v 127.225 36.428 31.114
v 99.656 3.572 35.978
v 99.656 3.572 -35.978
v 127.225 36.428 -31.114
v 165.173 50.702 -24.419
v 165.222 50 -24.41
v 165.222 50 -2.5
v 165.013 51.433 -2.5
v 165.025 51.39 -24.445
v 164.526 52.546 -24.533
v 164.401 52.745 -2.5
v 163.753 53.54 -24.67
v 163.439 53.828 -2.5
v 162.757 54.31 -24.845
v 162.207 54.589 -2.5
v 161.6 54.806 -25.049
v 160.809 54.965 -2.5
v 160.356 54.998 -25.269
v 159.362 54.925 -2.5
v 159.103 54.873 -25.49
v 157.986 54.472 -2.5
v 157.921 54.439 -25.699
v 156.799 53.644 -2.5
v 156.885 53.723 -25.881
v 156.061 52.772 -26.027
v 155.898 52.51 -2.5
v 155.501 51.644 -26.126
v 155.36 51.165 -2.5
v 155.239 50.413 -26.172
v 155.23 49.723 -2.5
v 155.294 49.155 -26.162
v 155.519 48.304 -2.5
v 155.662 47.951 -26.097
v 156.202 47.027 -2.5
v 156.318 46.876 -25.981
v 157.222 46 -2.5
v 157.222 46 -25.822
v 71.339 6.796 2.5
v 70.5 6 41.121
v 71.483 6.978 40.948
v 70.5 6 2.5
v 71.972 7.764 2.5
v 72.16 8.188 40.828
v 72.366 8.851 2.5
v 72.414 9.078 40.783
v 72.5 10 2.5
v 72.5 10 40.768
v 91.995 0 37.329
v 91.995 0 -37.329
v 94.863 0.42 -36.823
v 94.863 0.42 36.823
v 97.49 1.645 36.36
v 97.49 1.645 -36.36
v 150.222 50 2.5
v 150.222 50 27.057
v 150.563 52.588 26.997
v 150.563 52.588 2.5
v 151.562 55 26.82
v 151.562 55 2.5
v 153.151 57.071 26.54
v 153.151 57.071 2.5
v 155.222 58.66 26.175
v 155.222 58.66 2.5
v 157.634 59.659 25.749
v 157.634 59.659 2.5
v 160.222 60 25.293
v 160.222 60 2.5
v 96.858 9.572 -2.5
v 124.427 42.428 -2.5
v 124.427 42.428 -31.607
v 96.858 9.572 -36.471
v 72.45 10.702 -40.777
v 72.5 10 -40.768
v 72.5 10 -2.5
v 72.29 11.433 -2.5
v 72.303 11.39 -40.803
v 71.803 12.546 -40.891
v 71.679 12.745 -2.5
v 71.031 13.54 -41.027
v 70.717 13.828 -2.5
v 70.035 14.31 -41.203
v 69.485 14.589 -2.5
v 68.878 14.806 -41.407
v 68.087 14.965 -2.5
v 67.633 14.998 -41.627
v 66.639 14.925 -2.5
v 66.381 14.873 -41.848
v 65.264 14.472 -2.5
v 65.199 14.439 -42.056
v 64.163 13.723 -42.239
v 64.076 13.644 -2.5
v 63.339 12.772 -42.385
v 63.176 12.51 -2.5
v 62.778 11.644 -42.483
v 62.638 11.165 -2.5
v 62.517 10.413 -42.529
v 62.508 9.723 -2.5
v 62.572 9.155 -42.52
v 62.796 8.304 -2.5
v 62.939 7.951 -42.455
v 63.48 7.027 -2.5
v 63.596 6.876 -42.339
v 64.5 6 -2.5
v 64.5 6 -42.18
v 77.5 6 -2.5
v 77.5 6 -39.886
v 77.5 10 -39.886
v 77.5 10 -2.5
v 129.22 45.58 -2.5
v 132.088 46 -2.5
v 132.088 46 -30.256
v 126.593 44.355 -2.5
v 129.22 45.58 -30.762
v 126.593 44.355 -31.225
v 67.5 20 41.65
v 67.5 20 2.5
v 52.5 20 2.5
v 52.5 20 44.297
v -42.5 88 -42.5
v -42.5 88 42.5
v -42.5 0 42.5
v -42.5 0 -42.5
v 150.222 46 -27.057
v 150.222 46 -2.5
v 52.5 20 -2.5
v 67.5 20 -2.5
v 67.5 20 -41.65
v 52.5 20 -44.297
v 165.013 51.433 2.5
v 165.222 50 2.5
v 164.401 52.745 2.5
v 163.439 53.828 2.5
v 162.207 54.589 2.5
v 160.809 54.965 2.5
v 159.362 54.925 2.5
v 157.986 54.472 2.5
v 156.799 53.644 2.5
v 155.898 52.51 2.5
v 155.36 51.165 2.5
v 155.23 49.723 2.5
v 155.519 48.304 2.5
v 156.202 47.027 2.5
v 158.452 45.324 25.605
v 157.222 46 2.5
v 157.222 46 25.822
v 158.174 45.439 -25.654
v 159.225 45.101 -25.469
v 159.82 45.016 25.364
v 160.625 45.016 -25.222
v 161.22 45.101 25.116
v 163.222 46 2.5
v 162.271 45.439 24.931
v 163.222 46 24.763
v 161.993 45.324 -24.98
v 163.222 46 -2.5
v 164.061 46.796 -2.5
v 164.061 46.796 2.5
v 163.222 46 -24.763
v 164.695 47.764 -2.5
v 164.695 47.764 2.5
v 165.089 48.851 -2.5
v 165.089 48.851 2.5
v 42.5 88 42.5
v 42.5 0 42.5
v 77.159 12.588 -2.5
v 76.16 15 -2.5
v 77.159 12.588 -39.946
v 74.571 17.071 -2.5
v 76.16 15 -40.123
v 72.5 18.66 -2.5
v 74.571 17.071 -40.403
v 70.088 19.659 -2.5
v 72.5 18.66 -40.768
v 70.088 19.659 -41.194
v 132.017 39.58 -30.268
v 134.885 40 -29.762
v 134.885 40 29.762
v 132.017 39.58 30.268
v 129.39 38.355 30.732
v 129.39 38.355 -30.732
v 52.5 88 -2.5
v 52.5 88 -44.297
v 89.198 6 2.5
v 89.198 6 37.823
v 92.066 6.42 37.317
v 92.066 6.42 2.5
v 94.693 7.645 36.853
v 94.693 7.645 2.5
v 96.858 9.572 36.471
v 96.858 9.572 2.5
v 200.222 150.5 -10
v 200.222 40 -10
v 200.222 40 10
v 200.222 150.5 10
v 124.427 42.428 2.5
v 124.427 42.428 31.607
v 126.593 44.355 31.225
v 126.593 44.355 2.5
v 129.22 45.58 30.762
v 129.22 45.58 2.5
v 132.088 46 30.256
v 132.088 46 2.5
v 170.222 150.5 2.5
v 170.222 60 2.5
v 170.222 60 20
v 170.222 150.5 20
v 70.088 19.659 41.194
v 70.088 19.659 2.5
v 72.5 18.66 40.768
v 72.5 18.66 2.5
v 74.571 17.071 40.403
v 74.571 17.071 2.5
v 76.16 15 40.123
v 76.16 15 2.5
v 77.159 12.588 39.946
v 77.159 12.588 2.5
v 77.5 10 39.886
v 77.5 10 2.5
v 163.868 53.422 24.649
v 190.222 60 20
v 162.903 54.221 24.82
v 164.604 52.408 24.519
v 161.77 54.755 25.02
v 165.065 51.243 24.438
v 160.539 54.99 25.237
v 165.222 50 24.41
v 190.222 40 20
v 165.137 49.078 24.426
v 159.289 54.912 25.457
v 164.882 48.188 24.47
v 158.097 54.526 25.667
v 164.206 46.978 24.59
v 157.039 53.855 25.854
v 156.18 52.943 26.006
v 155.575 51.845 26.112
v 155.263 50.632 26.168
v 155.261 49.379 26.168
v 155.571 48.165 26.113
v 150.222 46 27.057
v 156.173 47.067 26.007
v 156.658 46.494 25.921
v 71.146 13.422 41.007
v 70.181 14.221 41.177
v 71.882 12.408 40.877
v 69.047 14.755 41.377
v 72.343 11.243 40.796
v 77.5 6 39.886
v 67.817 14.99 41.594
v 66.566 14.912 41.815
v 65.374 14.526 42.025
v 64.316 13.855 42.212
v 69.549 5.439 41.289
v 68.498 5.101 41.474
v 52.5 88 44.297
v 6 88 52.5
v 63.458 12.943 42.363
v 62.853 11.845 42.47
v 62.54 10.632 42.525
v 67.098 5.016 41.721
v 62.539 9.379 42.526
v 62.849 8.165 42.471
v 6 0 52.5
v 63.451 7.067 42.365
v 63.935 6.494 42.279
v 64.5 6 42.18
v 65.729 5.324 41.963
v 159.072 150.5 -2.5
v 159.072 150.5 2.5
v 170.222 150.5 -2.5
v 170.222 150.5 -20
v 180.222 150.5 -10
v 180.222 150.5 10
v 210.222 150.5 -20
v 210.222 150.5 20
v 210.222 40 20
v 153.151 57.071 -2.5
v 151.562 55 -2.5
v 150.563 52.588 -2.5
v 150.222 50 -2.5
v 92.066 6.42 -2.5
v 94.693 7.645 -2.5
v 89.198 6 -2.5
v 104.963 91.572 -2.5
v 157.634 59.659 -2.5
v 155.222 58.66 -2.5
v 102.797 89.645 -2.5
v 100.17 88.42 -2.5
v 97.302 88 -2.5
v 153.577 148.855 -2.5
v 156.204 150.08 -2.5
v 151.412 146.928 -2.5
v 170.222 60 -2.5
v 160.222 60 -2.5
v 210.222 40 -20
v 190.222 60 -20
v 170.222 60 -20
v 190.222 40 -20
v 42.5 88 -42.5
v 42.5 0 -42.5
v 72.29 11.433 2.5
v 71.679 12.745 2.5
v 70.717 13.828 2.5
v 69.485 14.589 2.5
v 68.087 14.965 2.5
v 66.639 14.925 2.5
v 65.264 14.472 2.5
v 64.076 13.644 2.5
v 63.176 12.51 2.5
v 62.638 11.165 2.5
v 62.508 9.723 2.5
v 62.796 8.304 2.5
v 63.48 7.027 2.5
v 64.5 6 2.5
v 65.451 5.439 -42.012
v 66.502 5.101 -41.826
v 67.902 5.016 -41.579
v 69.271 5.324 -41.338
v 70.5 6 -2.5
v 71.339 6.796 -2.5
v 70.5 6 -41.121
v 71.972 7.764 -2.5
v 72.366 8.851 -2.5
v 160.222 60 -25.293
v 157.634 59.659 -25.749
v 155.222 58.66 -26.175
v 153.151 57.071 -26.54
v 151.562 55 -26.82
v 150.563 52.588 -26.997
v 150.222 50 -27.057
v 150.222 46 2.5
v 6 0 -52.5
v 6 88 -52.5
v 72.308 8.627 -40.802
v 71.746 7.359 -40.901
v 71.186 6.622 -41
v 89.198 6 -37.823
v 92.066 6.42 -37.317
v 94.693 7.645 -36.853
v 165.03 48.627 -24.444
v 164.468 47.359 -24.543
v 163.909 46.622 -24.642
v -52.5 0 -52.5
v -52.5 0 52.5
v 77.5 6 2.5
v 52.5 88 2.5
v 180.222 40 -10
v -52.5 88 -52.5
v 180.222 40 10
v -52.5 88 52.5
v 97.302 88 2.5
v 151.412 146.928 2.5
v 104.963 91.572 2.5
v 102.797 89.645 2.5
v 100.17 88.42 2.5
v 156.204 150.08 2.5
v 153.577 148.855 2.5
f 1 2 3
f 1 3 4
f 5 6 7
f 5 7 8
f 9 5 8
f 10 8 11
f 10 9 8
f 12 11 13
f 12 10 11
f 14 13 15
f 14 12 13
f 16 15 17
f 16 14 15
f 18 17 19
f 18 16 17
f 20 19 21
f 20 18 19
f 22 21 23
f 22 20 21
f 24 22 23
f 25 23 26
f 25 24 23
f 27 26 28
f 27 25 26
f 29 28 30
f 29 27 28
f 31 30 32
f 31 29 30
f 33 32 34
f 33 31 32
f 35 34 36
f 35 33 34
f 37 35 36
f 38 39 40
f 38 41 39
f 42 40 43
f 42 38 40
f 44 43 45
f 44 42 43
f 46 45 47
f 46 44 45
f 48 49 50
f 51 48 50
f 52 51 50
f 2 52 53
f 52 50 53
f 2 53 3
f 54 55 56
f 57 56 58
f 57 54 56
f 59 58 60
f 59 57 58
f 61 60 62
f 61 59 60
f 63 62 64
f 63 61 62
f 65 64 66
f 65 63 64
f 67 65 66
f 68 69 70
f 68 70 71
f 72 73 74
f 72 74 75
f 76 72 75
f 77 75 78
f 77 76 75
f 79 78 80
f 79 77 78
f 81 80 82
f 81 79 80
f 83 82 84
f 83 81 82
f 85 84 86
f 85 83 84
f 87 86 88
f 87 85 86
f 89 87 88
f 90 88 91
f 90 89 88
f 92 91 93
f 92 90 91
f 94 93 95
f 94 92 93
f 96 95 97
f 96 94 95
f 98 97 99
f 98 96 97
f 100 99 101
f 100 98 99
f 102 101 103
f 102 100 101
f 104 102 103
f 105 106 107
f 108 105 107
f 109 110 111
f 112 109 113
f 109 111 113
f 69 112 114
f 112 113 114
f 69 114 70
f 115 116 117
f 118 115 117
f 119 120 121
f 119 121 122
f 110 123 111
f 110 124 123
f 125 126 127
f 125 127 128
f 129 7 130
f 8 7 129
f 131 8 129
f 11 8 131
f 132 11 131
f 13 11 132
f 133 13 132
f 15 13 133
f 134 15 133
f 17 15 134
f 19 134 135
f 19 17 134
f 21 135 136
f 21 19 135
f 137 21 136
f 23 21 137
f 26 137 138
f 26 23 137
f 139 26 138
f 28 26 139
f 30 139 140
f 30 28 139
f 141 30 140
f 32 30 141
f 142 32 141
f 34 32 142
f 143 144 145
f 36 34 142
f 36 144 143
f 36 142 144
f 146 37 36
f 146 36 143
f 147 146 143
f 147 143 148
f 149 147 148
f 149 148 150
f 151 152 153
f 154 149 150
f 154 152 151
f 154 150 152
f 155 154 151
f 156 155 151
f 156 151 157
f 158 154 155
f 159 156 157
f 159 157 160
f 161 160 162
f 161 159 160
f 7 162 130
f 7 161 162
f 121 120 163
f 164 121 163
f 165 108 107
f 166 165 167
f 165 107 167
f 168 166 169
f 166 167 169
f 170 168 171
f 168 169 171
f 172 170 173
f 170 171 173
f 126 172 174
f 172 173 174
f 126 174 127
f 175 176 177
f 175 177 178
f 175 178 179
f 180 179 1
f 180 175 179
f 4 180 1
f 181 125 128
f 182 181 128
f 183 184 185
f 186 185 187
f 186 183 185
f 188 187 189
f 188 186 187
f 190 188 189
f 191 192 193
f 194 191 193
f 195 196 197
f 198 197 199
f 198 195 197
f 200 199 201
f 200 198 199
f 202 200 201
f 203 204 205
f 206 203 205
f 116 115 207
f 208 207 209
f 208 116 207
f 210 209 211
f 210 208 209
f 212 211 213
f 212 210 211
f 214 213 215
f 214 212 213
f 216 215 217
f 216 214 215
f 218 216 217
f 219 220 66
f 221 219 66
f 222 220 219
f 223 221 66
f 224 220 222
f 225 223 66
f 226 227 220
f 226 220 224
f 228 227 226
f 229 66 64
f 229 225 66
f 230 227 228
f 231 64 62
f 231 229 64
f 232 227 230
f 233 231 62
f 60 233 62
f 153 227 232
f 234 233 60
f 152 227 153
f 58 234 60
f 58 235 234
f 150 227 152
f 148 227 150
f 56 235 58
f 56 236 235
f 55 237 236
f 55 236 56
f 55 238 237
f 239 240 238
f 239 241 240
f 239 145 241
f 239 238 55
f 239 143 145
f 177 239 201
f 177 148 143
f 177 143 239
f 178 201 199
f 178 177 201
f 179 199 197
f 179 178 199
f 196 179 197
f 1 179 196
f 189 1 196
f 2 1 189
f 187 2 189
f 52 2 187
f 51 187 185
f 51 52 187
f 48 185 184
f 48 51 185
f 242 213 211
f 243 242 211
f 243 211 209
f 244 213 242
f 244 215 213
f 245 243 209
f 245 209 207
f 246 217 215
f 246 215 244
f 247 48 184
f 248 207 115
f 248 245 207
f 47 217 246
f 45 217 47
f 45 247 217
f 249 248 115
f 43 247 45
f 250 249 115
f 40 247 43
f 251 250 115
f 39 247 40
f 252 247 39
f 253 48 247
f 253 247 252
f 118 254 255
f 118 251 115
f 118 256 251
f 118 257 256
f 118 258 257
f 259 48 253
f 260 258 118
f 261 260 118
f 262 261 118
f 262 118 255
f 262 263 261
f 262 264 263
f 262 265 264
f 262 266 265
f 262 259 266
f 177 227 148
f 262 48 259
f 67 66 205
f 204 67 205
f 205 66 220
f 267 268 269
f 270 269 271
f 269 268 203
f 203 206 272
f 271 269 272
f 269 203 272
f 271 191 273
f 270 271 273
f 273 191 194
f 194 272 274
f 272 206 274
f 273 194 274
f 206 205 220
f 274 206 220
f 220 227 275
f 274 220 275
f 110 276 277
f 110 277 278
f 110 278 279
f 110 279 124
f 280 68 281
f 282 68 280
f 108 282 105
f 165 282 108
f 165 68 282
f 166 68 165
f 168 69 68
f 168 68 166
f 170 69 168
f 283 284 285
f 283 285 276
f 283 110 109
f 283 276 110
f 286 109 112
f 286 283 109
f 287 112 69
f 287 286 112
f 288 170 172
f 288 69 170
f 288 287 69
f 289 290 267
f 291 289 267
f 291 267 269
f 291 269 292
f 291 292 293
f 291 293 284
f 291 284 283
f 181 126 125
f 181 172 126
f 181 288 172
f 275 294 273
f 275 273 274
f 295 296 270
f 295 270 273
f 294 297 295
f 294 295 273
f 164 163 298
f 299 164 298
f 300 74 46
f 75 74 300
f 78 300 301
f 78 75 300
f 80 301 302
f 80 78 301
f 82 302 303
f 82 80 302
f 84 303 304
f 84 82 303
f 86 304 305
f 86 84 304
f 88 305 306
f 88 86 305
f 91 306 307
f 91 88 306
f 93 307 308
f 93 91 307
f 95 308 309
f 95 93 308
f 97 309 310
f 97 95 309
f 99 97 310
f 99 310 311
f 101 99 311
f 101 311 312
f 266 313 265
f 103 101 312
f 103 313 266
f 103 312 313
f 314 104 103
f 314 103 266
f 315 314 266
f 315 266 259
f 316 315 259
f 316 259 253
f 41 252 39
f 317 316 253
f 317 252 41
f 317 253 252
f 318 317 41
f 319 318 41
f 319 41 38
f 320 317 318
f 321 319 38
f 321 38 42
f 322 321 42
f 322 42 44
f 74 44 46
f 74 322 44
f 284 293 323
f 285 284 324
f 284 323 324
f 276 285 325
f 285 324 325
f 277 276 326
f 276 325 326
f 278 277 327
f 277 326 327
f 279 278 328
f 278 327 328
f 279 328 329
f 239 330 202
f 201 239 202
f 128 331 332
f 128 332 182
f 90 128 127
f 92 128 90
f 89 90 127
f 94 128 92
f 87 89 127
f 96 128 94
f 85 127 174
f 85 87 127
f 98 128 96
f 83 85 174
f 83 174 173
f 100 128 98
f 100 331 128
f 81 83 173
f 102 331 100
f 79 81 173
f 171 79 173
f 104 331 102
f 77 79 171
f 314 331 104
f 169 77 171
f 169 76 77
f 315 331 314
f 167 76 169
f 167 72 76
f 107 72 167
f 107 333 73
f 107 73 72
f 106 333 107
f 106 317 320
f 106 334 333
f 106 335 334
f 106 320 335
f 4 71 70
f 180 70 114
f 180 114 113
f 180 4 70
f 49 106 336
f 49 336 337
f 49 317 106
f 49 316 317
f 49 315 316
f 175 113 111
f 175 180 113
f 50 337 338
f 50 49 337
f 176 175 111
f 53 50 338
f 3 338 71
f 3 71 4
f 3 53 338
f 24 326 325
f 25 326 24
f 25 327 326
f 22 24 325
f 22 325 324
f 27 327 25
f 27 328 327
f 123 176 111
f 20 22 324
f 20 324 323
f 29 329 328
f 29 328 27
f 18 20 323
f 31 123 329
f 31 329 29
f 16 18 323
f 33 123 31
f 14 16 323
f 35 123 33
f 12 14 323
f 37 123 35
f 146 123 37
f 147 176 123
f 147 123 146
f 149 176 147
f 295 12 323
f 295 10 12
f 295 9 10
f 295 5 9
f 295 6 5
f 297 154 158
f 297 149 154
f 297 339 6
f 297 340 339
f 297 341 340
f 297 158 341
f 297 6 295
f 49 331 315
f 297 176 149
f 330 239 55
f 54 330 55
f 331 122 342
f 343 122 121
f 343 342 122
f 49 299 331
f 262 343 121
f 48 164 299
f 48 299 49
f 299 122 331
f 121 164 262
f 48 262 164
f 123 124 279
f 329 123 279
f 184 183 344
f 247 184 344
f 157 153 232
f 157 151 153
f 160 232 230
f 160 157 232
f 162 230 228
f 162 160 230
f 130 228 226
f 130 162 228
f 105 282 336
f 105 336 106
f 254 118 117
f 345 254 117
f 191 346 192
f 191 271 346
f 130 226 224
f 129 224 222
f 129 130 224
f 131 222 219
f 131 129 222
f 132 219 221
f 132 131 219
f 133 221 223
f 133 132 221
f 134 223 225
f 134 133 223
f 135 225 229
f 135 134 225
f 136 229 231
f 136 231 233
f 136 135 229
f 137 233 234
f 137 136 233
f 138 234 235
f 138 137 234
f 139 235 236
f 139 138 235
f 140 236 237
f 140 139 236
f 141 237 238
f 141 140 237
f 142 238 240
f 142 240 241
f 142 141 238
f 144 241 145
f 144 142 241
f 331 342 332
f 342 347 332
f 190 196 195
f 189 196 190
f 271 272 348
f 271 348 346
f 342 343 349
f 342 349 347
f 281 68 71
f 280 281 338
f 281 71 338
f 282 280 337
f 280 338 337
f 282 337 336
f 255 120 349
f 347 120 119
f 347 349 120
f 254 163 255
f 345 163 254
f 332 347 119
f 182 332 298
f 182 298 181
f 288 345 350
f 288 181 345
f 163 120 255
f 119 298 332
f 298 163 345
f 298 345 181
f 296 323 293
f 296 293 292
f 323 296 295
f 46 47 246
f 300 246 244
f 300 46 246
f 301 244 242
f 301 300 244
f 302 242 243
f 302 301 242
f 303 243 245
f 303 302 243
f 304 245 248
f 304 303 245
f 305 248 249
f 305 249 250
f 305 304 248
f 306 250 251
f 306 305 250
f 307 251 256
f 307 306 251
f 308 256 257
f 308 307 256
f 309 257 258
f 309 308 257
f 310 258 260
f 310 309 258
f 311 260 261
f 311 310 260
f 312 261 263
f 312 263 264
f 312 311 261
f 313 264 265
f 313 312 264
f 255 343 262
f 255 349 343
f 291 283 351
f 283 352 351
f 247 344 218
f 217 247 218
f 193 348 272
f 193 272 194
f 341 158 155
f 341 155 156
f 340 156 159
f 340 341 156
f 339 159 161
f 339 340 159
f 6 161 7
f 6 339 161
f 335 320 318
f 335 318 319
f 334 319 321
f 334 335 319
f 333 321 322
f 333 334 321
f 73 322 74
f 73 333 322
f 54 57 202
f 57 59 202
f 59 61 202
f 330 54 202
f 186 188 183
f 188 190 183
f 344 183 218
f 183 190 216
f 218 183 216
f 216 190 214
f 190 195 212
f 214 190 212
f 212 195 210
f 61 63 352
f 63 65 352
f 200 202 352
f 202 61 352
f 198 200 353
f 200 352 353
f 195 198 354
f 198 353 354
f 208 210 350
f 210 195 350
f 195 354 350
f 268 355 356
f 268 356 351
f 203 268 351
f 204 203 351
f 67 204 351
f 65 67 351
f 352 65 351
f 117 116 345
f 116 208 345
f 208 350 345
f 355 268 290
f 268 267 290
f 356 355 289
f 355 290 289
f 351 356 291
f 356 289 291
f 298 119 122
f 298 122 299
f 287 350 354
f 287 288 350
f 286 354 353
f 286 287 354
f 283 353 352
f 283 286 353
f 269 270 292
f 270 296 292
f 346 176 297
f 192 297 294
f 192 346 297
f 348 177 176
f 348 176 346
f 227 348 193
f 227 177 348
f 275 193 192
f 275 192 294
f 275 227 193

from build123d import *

# Parameters (mm, degrees)
ESQUISSE1_W                   = 105
ESQUISSE1_H                   = 105
ESQUISSE1_W_2                 = 85
ESQUISSE1_H_2                 = 85
BOSS_EXTRU_3_DEPTH            = 88
BOSS_EXTRU_4_DEPTH            = 105
ESQUISSE7_W                   = 40
ESQUISSE7_H                   = 40
ESQUISSE7_W_2                 = 20
ESQUISSE7_H_2                 = 20
BOSS_EXTRU_11_DEPTH           = 110.5
ENL_V_MAT_EXTRU_9_REACH       = 242.562
ESQUISSE13_W                  = 10
ESQUISSE13_H                  = 20
BOSS_EXTRU_12_DEPTH           = 2.5
ESQUISSE17_R                  = 5
ESQUISSE17_W                  = 40
ESQUISSE17_H                  = 20
BOSS_EXTRU_13_DEPTH           = 52.5
ENL_V_MAT_EXTRU_12_DEPTH      = 265.326910813
ENL_V_MAT_EXTRU_12_DEPTH_BACK = 265.326910813
ESQUISSE18_R                  = 5
ENL_V_MAT_EXTRU_13_REACH      = 236.819
ESQUISSE19_W                  = 10
ESQUISSE19_H                  = 20
CONG_1_R                      = 10
ENL_V_MAT_EXTRU_15_DEPTH      = 88


with BuildPart() as part:
    # Esquisse1 → Boss.-Extru.3 (new body)
    with BuildSketch(Plane(origin=(0, 0, 0), x_dir=(1, 0, 0), z_dir=(0, 1, 0))):
        Rectangle(ESQUISSE1_W, ESQUISSE1_H)
        Rectangle(ESQUISSE1_W_2, ESQUISSE1_H_2, mode=Mode.SUBTRACT)
    extrude(amount=BOSS_EXTRU_3_DEPTH)

    # Esquisse3 → Boss.-Extru.4 (add)
    with BuildSketch(Plane.XY.offset(52.5)):
        Polygon((52.5, 6), (52.5, 0), (96.658434537, 0), (130.222419784, 40), (190.222419784, 40), (190.222419784, 46), (127.424573836, 46), (93.860588588, 6), align=None)
    extrude(amount=-BOSS_EXTRU_4_DEPTH)

    # Esquisse7 → Boss.-Extru.11 (add)
    with BuildSketch(Plane.XZ.offset(-40)):
        with Locations((190.222419784, 0)):
            Rectangle(ESQUISSE7_W, ESQUISSE7_H)
        with Locations((190.222419784, 0)):
            Rectangle(ESQUISSE7_W_2, ESQUISSE7_H_2, mode=Mode.SUBTRACT)
    extrude(amount=-BOSS_EXTRU_11_DEPTH)

    # Esquisse13 → Enlèv. mat.-Extru.9 (cut, up to next)
    with BuildSketch(Plane(origin=(0, 46, 0), x_dir=(1, 0, 0), z_dir=(0, 1, 0)), mode=Mode.PRIVATE) as enl_v_mat_extru_9_sk1:
        with Locations((185.222419784, 0)):
            Rectangle(ESQUISSE13_W, ESQUISSE13_H)
    enl_v_mat_extru_9_tool1 = extrude(enl_v_mat_extru_9_sk1.sketch, amount=-ENL_V_MAT_EXTRU_9_REACH, mode=Mode.PRIVATE) & part.part
    add(enl_v_mat_extru_9_tool1.solids().sort_by_distance((185.22242, 46, 0))[0], mode=Mode.SUBTRACT)

    # Esquisse14 → Boss.-Extru.12 (add, symmetric)
    with BuildSketch(Plane.XY):
        Polygon((52.5, 88), (101.965319391, 88), (154.40904634, 150.5), (170.222419784, 150.5), (170.222419784, 46), (127.424573836, 46), (93.860588588, 6), (52.5, 6), align=None)
    extrude(amount=BOSS_EXTRU_12_DEPTH, both=True)

    # Esquisse17 → Boss.-Extru.13 (add, symmetric)
    # profile 1 of 2: a face of its own
    with BuildSketch(Plane.XY):
        Polygon((44, 20), (44, 0), (77.5, 0), (77.5, 6), (77.5, 20), align=None)
        with Locations((67.5, 10)):
            Circle(ESQUISSE17_R, mode=Mode.SUBTRACT)
    # profile 2 of 2: a face of its own
    with BuildSketch(Plane.XY):
        with Locations((170.222419784, 50)):
            Rectangle(ESQUISSE17_W, ESQUISSE17_H)
        with Locations((160.222419784, 50)):
            Circle(ESQUISSE17_R, mode=Mode.SUBTRACT)
    extrude(amount=BOSS_EXTRU_13_DEPTH, both=True)

    # Esquisse18 → Enlèv. mat.-Extru.12 (cut, two sides: drawn at the far end of the back side and taken through both)
    with BuildSketch(Plane.XY.offset(2.5).offset(-ENL_V_MAT_EXTRU_12_DEPTH_BACK)):
        with Locations((160.222419784, 50)):
            Circle(ESQUISSE18_R)
        with Locations((67.5, 10)):
            Circle(ESQUISSE18_R)
    extrude(amount=ENL_V_MAT_EXTRU_12_DEPTH + ENL_V_MAT_EXTRU_12_DEPTH_BACK, mode=Mode.SUBTRACT)

    # Esquisse19 → Enlèv. mat.-Extru.13 (cut, up to next)
    with BuildSketch(Plane(origin=(0, 60, 0), x_dir=(1, 0, 0), z_dir=(0, 1, 0)), mode=Mode.PRIVATE) as enl_v_mat_extru_13_sk1:
        with Locations((185.222419784, 0)):
            Rectangle(ESQUISSE19_W, ESQUISSE19_H)
    enl_v_mat_extru_13_tool1 = extrude(enl_v_mat_extru_13_sk1.sketch, amount=-ENL_V_MAT_EXTRU_13_REACH, mode=Mode.PRIVATE) & part.part
    add(enl_v_mat_extru_13_tool1.solids().sort_by_distance((185.22242, 60, 0))[0], mode=Mode.SUBTRACT)

    # Congé1
    cong_1_edges = [part.edges().sort_by_distance(p)[0] for p in [
        (93.860588588, 6, 27.5),
        (127.424573836, 46, 27.5),
        (154.40904634, 150.5, 0),
        (101.965319391, 88, 0),
        (77.5, 20, 27.5),
        (77.5, 20, -27.5),
        (150.222419784, 60, 27.5),
        (150.222419784, 60, -27.5),
        (127.424573836, 46, -27.5),
        (93.860588588, 6, -27.5),
        (96.658434537, 0, 0),
        (130.222419784, 40, 0),
    ]]
    fillet(cong_1_edges, radius=CONG_1_R)

    # Esquisse20 → Enlèv. mat.-Extru.15 (cut)
    with BuildSketch(Plane(origin=(0, 0, 0), x_dir=(1, 0, 0), z_dir=(0, 1, 0))):
        Polygon((6, 52.5), (190.222419784, 20), (210.222419784, 20), (210.222419784, 52.5), align=None)
        Polygon((210.222419784, -20), (190.222419784, -20), (6, -52.5), (210.222419784, -52.5), align=None)
    extrude(amount=ENL_V_MAT_EXTRU_15_DEPTH, mode=Mode.SUBTRACT)


solid = part.part
